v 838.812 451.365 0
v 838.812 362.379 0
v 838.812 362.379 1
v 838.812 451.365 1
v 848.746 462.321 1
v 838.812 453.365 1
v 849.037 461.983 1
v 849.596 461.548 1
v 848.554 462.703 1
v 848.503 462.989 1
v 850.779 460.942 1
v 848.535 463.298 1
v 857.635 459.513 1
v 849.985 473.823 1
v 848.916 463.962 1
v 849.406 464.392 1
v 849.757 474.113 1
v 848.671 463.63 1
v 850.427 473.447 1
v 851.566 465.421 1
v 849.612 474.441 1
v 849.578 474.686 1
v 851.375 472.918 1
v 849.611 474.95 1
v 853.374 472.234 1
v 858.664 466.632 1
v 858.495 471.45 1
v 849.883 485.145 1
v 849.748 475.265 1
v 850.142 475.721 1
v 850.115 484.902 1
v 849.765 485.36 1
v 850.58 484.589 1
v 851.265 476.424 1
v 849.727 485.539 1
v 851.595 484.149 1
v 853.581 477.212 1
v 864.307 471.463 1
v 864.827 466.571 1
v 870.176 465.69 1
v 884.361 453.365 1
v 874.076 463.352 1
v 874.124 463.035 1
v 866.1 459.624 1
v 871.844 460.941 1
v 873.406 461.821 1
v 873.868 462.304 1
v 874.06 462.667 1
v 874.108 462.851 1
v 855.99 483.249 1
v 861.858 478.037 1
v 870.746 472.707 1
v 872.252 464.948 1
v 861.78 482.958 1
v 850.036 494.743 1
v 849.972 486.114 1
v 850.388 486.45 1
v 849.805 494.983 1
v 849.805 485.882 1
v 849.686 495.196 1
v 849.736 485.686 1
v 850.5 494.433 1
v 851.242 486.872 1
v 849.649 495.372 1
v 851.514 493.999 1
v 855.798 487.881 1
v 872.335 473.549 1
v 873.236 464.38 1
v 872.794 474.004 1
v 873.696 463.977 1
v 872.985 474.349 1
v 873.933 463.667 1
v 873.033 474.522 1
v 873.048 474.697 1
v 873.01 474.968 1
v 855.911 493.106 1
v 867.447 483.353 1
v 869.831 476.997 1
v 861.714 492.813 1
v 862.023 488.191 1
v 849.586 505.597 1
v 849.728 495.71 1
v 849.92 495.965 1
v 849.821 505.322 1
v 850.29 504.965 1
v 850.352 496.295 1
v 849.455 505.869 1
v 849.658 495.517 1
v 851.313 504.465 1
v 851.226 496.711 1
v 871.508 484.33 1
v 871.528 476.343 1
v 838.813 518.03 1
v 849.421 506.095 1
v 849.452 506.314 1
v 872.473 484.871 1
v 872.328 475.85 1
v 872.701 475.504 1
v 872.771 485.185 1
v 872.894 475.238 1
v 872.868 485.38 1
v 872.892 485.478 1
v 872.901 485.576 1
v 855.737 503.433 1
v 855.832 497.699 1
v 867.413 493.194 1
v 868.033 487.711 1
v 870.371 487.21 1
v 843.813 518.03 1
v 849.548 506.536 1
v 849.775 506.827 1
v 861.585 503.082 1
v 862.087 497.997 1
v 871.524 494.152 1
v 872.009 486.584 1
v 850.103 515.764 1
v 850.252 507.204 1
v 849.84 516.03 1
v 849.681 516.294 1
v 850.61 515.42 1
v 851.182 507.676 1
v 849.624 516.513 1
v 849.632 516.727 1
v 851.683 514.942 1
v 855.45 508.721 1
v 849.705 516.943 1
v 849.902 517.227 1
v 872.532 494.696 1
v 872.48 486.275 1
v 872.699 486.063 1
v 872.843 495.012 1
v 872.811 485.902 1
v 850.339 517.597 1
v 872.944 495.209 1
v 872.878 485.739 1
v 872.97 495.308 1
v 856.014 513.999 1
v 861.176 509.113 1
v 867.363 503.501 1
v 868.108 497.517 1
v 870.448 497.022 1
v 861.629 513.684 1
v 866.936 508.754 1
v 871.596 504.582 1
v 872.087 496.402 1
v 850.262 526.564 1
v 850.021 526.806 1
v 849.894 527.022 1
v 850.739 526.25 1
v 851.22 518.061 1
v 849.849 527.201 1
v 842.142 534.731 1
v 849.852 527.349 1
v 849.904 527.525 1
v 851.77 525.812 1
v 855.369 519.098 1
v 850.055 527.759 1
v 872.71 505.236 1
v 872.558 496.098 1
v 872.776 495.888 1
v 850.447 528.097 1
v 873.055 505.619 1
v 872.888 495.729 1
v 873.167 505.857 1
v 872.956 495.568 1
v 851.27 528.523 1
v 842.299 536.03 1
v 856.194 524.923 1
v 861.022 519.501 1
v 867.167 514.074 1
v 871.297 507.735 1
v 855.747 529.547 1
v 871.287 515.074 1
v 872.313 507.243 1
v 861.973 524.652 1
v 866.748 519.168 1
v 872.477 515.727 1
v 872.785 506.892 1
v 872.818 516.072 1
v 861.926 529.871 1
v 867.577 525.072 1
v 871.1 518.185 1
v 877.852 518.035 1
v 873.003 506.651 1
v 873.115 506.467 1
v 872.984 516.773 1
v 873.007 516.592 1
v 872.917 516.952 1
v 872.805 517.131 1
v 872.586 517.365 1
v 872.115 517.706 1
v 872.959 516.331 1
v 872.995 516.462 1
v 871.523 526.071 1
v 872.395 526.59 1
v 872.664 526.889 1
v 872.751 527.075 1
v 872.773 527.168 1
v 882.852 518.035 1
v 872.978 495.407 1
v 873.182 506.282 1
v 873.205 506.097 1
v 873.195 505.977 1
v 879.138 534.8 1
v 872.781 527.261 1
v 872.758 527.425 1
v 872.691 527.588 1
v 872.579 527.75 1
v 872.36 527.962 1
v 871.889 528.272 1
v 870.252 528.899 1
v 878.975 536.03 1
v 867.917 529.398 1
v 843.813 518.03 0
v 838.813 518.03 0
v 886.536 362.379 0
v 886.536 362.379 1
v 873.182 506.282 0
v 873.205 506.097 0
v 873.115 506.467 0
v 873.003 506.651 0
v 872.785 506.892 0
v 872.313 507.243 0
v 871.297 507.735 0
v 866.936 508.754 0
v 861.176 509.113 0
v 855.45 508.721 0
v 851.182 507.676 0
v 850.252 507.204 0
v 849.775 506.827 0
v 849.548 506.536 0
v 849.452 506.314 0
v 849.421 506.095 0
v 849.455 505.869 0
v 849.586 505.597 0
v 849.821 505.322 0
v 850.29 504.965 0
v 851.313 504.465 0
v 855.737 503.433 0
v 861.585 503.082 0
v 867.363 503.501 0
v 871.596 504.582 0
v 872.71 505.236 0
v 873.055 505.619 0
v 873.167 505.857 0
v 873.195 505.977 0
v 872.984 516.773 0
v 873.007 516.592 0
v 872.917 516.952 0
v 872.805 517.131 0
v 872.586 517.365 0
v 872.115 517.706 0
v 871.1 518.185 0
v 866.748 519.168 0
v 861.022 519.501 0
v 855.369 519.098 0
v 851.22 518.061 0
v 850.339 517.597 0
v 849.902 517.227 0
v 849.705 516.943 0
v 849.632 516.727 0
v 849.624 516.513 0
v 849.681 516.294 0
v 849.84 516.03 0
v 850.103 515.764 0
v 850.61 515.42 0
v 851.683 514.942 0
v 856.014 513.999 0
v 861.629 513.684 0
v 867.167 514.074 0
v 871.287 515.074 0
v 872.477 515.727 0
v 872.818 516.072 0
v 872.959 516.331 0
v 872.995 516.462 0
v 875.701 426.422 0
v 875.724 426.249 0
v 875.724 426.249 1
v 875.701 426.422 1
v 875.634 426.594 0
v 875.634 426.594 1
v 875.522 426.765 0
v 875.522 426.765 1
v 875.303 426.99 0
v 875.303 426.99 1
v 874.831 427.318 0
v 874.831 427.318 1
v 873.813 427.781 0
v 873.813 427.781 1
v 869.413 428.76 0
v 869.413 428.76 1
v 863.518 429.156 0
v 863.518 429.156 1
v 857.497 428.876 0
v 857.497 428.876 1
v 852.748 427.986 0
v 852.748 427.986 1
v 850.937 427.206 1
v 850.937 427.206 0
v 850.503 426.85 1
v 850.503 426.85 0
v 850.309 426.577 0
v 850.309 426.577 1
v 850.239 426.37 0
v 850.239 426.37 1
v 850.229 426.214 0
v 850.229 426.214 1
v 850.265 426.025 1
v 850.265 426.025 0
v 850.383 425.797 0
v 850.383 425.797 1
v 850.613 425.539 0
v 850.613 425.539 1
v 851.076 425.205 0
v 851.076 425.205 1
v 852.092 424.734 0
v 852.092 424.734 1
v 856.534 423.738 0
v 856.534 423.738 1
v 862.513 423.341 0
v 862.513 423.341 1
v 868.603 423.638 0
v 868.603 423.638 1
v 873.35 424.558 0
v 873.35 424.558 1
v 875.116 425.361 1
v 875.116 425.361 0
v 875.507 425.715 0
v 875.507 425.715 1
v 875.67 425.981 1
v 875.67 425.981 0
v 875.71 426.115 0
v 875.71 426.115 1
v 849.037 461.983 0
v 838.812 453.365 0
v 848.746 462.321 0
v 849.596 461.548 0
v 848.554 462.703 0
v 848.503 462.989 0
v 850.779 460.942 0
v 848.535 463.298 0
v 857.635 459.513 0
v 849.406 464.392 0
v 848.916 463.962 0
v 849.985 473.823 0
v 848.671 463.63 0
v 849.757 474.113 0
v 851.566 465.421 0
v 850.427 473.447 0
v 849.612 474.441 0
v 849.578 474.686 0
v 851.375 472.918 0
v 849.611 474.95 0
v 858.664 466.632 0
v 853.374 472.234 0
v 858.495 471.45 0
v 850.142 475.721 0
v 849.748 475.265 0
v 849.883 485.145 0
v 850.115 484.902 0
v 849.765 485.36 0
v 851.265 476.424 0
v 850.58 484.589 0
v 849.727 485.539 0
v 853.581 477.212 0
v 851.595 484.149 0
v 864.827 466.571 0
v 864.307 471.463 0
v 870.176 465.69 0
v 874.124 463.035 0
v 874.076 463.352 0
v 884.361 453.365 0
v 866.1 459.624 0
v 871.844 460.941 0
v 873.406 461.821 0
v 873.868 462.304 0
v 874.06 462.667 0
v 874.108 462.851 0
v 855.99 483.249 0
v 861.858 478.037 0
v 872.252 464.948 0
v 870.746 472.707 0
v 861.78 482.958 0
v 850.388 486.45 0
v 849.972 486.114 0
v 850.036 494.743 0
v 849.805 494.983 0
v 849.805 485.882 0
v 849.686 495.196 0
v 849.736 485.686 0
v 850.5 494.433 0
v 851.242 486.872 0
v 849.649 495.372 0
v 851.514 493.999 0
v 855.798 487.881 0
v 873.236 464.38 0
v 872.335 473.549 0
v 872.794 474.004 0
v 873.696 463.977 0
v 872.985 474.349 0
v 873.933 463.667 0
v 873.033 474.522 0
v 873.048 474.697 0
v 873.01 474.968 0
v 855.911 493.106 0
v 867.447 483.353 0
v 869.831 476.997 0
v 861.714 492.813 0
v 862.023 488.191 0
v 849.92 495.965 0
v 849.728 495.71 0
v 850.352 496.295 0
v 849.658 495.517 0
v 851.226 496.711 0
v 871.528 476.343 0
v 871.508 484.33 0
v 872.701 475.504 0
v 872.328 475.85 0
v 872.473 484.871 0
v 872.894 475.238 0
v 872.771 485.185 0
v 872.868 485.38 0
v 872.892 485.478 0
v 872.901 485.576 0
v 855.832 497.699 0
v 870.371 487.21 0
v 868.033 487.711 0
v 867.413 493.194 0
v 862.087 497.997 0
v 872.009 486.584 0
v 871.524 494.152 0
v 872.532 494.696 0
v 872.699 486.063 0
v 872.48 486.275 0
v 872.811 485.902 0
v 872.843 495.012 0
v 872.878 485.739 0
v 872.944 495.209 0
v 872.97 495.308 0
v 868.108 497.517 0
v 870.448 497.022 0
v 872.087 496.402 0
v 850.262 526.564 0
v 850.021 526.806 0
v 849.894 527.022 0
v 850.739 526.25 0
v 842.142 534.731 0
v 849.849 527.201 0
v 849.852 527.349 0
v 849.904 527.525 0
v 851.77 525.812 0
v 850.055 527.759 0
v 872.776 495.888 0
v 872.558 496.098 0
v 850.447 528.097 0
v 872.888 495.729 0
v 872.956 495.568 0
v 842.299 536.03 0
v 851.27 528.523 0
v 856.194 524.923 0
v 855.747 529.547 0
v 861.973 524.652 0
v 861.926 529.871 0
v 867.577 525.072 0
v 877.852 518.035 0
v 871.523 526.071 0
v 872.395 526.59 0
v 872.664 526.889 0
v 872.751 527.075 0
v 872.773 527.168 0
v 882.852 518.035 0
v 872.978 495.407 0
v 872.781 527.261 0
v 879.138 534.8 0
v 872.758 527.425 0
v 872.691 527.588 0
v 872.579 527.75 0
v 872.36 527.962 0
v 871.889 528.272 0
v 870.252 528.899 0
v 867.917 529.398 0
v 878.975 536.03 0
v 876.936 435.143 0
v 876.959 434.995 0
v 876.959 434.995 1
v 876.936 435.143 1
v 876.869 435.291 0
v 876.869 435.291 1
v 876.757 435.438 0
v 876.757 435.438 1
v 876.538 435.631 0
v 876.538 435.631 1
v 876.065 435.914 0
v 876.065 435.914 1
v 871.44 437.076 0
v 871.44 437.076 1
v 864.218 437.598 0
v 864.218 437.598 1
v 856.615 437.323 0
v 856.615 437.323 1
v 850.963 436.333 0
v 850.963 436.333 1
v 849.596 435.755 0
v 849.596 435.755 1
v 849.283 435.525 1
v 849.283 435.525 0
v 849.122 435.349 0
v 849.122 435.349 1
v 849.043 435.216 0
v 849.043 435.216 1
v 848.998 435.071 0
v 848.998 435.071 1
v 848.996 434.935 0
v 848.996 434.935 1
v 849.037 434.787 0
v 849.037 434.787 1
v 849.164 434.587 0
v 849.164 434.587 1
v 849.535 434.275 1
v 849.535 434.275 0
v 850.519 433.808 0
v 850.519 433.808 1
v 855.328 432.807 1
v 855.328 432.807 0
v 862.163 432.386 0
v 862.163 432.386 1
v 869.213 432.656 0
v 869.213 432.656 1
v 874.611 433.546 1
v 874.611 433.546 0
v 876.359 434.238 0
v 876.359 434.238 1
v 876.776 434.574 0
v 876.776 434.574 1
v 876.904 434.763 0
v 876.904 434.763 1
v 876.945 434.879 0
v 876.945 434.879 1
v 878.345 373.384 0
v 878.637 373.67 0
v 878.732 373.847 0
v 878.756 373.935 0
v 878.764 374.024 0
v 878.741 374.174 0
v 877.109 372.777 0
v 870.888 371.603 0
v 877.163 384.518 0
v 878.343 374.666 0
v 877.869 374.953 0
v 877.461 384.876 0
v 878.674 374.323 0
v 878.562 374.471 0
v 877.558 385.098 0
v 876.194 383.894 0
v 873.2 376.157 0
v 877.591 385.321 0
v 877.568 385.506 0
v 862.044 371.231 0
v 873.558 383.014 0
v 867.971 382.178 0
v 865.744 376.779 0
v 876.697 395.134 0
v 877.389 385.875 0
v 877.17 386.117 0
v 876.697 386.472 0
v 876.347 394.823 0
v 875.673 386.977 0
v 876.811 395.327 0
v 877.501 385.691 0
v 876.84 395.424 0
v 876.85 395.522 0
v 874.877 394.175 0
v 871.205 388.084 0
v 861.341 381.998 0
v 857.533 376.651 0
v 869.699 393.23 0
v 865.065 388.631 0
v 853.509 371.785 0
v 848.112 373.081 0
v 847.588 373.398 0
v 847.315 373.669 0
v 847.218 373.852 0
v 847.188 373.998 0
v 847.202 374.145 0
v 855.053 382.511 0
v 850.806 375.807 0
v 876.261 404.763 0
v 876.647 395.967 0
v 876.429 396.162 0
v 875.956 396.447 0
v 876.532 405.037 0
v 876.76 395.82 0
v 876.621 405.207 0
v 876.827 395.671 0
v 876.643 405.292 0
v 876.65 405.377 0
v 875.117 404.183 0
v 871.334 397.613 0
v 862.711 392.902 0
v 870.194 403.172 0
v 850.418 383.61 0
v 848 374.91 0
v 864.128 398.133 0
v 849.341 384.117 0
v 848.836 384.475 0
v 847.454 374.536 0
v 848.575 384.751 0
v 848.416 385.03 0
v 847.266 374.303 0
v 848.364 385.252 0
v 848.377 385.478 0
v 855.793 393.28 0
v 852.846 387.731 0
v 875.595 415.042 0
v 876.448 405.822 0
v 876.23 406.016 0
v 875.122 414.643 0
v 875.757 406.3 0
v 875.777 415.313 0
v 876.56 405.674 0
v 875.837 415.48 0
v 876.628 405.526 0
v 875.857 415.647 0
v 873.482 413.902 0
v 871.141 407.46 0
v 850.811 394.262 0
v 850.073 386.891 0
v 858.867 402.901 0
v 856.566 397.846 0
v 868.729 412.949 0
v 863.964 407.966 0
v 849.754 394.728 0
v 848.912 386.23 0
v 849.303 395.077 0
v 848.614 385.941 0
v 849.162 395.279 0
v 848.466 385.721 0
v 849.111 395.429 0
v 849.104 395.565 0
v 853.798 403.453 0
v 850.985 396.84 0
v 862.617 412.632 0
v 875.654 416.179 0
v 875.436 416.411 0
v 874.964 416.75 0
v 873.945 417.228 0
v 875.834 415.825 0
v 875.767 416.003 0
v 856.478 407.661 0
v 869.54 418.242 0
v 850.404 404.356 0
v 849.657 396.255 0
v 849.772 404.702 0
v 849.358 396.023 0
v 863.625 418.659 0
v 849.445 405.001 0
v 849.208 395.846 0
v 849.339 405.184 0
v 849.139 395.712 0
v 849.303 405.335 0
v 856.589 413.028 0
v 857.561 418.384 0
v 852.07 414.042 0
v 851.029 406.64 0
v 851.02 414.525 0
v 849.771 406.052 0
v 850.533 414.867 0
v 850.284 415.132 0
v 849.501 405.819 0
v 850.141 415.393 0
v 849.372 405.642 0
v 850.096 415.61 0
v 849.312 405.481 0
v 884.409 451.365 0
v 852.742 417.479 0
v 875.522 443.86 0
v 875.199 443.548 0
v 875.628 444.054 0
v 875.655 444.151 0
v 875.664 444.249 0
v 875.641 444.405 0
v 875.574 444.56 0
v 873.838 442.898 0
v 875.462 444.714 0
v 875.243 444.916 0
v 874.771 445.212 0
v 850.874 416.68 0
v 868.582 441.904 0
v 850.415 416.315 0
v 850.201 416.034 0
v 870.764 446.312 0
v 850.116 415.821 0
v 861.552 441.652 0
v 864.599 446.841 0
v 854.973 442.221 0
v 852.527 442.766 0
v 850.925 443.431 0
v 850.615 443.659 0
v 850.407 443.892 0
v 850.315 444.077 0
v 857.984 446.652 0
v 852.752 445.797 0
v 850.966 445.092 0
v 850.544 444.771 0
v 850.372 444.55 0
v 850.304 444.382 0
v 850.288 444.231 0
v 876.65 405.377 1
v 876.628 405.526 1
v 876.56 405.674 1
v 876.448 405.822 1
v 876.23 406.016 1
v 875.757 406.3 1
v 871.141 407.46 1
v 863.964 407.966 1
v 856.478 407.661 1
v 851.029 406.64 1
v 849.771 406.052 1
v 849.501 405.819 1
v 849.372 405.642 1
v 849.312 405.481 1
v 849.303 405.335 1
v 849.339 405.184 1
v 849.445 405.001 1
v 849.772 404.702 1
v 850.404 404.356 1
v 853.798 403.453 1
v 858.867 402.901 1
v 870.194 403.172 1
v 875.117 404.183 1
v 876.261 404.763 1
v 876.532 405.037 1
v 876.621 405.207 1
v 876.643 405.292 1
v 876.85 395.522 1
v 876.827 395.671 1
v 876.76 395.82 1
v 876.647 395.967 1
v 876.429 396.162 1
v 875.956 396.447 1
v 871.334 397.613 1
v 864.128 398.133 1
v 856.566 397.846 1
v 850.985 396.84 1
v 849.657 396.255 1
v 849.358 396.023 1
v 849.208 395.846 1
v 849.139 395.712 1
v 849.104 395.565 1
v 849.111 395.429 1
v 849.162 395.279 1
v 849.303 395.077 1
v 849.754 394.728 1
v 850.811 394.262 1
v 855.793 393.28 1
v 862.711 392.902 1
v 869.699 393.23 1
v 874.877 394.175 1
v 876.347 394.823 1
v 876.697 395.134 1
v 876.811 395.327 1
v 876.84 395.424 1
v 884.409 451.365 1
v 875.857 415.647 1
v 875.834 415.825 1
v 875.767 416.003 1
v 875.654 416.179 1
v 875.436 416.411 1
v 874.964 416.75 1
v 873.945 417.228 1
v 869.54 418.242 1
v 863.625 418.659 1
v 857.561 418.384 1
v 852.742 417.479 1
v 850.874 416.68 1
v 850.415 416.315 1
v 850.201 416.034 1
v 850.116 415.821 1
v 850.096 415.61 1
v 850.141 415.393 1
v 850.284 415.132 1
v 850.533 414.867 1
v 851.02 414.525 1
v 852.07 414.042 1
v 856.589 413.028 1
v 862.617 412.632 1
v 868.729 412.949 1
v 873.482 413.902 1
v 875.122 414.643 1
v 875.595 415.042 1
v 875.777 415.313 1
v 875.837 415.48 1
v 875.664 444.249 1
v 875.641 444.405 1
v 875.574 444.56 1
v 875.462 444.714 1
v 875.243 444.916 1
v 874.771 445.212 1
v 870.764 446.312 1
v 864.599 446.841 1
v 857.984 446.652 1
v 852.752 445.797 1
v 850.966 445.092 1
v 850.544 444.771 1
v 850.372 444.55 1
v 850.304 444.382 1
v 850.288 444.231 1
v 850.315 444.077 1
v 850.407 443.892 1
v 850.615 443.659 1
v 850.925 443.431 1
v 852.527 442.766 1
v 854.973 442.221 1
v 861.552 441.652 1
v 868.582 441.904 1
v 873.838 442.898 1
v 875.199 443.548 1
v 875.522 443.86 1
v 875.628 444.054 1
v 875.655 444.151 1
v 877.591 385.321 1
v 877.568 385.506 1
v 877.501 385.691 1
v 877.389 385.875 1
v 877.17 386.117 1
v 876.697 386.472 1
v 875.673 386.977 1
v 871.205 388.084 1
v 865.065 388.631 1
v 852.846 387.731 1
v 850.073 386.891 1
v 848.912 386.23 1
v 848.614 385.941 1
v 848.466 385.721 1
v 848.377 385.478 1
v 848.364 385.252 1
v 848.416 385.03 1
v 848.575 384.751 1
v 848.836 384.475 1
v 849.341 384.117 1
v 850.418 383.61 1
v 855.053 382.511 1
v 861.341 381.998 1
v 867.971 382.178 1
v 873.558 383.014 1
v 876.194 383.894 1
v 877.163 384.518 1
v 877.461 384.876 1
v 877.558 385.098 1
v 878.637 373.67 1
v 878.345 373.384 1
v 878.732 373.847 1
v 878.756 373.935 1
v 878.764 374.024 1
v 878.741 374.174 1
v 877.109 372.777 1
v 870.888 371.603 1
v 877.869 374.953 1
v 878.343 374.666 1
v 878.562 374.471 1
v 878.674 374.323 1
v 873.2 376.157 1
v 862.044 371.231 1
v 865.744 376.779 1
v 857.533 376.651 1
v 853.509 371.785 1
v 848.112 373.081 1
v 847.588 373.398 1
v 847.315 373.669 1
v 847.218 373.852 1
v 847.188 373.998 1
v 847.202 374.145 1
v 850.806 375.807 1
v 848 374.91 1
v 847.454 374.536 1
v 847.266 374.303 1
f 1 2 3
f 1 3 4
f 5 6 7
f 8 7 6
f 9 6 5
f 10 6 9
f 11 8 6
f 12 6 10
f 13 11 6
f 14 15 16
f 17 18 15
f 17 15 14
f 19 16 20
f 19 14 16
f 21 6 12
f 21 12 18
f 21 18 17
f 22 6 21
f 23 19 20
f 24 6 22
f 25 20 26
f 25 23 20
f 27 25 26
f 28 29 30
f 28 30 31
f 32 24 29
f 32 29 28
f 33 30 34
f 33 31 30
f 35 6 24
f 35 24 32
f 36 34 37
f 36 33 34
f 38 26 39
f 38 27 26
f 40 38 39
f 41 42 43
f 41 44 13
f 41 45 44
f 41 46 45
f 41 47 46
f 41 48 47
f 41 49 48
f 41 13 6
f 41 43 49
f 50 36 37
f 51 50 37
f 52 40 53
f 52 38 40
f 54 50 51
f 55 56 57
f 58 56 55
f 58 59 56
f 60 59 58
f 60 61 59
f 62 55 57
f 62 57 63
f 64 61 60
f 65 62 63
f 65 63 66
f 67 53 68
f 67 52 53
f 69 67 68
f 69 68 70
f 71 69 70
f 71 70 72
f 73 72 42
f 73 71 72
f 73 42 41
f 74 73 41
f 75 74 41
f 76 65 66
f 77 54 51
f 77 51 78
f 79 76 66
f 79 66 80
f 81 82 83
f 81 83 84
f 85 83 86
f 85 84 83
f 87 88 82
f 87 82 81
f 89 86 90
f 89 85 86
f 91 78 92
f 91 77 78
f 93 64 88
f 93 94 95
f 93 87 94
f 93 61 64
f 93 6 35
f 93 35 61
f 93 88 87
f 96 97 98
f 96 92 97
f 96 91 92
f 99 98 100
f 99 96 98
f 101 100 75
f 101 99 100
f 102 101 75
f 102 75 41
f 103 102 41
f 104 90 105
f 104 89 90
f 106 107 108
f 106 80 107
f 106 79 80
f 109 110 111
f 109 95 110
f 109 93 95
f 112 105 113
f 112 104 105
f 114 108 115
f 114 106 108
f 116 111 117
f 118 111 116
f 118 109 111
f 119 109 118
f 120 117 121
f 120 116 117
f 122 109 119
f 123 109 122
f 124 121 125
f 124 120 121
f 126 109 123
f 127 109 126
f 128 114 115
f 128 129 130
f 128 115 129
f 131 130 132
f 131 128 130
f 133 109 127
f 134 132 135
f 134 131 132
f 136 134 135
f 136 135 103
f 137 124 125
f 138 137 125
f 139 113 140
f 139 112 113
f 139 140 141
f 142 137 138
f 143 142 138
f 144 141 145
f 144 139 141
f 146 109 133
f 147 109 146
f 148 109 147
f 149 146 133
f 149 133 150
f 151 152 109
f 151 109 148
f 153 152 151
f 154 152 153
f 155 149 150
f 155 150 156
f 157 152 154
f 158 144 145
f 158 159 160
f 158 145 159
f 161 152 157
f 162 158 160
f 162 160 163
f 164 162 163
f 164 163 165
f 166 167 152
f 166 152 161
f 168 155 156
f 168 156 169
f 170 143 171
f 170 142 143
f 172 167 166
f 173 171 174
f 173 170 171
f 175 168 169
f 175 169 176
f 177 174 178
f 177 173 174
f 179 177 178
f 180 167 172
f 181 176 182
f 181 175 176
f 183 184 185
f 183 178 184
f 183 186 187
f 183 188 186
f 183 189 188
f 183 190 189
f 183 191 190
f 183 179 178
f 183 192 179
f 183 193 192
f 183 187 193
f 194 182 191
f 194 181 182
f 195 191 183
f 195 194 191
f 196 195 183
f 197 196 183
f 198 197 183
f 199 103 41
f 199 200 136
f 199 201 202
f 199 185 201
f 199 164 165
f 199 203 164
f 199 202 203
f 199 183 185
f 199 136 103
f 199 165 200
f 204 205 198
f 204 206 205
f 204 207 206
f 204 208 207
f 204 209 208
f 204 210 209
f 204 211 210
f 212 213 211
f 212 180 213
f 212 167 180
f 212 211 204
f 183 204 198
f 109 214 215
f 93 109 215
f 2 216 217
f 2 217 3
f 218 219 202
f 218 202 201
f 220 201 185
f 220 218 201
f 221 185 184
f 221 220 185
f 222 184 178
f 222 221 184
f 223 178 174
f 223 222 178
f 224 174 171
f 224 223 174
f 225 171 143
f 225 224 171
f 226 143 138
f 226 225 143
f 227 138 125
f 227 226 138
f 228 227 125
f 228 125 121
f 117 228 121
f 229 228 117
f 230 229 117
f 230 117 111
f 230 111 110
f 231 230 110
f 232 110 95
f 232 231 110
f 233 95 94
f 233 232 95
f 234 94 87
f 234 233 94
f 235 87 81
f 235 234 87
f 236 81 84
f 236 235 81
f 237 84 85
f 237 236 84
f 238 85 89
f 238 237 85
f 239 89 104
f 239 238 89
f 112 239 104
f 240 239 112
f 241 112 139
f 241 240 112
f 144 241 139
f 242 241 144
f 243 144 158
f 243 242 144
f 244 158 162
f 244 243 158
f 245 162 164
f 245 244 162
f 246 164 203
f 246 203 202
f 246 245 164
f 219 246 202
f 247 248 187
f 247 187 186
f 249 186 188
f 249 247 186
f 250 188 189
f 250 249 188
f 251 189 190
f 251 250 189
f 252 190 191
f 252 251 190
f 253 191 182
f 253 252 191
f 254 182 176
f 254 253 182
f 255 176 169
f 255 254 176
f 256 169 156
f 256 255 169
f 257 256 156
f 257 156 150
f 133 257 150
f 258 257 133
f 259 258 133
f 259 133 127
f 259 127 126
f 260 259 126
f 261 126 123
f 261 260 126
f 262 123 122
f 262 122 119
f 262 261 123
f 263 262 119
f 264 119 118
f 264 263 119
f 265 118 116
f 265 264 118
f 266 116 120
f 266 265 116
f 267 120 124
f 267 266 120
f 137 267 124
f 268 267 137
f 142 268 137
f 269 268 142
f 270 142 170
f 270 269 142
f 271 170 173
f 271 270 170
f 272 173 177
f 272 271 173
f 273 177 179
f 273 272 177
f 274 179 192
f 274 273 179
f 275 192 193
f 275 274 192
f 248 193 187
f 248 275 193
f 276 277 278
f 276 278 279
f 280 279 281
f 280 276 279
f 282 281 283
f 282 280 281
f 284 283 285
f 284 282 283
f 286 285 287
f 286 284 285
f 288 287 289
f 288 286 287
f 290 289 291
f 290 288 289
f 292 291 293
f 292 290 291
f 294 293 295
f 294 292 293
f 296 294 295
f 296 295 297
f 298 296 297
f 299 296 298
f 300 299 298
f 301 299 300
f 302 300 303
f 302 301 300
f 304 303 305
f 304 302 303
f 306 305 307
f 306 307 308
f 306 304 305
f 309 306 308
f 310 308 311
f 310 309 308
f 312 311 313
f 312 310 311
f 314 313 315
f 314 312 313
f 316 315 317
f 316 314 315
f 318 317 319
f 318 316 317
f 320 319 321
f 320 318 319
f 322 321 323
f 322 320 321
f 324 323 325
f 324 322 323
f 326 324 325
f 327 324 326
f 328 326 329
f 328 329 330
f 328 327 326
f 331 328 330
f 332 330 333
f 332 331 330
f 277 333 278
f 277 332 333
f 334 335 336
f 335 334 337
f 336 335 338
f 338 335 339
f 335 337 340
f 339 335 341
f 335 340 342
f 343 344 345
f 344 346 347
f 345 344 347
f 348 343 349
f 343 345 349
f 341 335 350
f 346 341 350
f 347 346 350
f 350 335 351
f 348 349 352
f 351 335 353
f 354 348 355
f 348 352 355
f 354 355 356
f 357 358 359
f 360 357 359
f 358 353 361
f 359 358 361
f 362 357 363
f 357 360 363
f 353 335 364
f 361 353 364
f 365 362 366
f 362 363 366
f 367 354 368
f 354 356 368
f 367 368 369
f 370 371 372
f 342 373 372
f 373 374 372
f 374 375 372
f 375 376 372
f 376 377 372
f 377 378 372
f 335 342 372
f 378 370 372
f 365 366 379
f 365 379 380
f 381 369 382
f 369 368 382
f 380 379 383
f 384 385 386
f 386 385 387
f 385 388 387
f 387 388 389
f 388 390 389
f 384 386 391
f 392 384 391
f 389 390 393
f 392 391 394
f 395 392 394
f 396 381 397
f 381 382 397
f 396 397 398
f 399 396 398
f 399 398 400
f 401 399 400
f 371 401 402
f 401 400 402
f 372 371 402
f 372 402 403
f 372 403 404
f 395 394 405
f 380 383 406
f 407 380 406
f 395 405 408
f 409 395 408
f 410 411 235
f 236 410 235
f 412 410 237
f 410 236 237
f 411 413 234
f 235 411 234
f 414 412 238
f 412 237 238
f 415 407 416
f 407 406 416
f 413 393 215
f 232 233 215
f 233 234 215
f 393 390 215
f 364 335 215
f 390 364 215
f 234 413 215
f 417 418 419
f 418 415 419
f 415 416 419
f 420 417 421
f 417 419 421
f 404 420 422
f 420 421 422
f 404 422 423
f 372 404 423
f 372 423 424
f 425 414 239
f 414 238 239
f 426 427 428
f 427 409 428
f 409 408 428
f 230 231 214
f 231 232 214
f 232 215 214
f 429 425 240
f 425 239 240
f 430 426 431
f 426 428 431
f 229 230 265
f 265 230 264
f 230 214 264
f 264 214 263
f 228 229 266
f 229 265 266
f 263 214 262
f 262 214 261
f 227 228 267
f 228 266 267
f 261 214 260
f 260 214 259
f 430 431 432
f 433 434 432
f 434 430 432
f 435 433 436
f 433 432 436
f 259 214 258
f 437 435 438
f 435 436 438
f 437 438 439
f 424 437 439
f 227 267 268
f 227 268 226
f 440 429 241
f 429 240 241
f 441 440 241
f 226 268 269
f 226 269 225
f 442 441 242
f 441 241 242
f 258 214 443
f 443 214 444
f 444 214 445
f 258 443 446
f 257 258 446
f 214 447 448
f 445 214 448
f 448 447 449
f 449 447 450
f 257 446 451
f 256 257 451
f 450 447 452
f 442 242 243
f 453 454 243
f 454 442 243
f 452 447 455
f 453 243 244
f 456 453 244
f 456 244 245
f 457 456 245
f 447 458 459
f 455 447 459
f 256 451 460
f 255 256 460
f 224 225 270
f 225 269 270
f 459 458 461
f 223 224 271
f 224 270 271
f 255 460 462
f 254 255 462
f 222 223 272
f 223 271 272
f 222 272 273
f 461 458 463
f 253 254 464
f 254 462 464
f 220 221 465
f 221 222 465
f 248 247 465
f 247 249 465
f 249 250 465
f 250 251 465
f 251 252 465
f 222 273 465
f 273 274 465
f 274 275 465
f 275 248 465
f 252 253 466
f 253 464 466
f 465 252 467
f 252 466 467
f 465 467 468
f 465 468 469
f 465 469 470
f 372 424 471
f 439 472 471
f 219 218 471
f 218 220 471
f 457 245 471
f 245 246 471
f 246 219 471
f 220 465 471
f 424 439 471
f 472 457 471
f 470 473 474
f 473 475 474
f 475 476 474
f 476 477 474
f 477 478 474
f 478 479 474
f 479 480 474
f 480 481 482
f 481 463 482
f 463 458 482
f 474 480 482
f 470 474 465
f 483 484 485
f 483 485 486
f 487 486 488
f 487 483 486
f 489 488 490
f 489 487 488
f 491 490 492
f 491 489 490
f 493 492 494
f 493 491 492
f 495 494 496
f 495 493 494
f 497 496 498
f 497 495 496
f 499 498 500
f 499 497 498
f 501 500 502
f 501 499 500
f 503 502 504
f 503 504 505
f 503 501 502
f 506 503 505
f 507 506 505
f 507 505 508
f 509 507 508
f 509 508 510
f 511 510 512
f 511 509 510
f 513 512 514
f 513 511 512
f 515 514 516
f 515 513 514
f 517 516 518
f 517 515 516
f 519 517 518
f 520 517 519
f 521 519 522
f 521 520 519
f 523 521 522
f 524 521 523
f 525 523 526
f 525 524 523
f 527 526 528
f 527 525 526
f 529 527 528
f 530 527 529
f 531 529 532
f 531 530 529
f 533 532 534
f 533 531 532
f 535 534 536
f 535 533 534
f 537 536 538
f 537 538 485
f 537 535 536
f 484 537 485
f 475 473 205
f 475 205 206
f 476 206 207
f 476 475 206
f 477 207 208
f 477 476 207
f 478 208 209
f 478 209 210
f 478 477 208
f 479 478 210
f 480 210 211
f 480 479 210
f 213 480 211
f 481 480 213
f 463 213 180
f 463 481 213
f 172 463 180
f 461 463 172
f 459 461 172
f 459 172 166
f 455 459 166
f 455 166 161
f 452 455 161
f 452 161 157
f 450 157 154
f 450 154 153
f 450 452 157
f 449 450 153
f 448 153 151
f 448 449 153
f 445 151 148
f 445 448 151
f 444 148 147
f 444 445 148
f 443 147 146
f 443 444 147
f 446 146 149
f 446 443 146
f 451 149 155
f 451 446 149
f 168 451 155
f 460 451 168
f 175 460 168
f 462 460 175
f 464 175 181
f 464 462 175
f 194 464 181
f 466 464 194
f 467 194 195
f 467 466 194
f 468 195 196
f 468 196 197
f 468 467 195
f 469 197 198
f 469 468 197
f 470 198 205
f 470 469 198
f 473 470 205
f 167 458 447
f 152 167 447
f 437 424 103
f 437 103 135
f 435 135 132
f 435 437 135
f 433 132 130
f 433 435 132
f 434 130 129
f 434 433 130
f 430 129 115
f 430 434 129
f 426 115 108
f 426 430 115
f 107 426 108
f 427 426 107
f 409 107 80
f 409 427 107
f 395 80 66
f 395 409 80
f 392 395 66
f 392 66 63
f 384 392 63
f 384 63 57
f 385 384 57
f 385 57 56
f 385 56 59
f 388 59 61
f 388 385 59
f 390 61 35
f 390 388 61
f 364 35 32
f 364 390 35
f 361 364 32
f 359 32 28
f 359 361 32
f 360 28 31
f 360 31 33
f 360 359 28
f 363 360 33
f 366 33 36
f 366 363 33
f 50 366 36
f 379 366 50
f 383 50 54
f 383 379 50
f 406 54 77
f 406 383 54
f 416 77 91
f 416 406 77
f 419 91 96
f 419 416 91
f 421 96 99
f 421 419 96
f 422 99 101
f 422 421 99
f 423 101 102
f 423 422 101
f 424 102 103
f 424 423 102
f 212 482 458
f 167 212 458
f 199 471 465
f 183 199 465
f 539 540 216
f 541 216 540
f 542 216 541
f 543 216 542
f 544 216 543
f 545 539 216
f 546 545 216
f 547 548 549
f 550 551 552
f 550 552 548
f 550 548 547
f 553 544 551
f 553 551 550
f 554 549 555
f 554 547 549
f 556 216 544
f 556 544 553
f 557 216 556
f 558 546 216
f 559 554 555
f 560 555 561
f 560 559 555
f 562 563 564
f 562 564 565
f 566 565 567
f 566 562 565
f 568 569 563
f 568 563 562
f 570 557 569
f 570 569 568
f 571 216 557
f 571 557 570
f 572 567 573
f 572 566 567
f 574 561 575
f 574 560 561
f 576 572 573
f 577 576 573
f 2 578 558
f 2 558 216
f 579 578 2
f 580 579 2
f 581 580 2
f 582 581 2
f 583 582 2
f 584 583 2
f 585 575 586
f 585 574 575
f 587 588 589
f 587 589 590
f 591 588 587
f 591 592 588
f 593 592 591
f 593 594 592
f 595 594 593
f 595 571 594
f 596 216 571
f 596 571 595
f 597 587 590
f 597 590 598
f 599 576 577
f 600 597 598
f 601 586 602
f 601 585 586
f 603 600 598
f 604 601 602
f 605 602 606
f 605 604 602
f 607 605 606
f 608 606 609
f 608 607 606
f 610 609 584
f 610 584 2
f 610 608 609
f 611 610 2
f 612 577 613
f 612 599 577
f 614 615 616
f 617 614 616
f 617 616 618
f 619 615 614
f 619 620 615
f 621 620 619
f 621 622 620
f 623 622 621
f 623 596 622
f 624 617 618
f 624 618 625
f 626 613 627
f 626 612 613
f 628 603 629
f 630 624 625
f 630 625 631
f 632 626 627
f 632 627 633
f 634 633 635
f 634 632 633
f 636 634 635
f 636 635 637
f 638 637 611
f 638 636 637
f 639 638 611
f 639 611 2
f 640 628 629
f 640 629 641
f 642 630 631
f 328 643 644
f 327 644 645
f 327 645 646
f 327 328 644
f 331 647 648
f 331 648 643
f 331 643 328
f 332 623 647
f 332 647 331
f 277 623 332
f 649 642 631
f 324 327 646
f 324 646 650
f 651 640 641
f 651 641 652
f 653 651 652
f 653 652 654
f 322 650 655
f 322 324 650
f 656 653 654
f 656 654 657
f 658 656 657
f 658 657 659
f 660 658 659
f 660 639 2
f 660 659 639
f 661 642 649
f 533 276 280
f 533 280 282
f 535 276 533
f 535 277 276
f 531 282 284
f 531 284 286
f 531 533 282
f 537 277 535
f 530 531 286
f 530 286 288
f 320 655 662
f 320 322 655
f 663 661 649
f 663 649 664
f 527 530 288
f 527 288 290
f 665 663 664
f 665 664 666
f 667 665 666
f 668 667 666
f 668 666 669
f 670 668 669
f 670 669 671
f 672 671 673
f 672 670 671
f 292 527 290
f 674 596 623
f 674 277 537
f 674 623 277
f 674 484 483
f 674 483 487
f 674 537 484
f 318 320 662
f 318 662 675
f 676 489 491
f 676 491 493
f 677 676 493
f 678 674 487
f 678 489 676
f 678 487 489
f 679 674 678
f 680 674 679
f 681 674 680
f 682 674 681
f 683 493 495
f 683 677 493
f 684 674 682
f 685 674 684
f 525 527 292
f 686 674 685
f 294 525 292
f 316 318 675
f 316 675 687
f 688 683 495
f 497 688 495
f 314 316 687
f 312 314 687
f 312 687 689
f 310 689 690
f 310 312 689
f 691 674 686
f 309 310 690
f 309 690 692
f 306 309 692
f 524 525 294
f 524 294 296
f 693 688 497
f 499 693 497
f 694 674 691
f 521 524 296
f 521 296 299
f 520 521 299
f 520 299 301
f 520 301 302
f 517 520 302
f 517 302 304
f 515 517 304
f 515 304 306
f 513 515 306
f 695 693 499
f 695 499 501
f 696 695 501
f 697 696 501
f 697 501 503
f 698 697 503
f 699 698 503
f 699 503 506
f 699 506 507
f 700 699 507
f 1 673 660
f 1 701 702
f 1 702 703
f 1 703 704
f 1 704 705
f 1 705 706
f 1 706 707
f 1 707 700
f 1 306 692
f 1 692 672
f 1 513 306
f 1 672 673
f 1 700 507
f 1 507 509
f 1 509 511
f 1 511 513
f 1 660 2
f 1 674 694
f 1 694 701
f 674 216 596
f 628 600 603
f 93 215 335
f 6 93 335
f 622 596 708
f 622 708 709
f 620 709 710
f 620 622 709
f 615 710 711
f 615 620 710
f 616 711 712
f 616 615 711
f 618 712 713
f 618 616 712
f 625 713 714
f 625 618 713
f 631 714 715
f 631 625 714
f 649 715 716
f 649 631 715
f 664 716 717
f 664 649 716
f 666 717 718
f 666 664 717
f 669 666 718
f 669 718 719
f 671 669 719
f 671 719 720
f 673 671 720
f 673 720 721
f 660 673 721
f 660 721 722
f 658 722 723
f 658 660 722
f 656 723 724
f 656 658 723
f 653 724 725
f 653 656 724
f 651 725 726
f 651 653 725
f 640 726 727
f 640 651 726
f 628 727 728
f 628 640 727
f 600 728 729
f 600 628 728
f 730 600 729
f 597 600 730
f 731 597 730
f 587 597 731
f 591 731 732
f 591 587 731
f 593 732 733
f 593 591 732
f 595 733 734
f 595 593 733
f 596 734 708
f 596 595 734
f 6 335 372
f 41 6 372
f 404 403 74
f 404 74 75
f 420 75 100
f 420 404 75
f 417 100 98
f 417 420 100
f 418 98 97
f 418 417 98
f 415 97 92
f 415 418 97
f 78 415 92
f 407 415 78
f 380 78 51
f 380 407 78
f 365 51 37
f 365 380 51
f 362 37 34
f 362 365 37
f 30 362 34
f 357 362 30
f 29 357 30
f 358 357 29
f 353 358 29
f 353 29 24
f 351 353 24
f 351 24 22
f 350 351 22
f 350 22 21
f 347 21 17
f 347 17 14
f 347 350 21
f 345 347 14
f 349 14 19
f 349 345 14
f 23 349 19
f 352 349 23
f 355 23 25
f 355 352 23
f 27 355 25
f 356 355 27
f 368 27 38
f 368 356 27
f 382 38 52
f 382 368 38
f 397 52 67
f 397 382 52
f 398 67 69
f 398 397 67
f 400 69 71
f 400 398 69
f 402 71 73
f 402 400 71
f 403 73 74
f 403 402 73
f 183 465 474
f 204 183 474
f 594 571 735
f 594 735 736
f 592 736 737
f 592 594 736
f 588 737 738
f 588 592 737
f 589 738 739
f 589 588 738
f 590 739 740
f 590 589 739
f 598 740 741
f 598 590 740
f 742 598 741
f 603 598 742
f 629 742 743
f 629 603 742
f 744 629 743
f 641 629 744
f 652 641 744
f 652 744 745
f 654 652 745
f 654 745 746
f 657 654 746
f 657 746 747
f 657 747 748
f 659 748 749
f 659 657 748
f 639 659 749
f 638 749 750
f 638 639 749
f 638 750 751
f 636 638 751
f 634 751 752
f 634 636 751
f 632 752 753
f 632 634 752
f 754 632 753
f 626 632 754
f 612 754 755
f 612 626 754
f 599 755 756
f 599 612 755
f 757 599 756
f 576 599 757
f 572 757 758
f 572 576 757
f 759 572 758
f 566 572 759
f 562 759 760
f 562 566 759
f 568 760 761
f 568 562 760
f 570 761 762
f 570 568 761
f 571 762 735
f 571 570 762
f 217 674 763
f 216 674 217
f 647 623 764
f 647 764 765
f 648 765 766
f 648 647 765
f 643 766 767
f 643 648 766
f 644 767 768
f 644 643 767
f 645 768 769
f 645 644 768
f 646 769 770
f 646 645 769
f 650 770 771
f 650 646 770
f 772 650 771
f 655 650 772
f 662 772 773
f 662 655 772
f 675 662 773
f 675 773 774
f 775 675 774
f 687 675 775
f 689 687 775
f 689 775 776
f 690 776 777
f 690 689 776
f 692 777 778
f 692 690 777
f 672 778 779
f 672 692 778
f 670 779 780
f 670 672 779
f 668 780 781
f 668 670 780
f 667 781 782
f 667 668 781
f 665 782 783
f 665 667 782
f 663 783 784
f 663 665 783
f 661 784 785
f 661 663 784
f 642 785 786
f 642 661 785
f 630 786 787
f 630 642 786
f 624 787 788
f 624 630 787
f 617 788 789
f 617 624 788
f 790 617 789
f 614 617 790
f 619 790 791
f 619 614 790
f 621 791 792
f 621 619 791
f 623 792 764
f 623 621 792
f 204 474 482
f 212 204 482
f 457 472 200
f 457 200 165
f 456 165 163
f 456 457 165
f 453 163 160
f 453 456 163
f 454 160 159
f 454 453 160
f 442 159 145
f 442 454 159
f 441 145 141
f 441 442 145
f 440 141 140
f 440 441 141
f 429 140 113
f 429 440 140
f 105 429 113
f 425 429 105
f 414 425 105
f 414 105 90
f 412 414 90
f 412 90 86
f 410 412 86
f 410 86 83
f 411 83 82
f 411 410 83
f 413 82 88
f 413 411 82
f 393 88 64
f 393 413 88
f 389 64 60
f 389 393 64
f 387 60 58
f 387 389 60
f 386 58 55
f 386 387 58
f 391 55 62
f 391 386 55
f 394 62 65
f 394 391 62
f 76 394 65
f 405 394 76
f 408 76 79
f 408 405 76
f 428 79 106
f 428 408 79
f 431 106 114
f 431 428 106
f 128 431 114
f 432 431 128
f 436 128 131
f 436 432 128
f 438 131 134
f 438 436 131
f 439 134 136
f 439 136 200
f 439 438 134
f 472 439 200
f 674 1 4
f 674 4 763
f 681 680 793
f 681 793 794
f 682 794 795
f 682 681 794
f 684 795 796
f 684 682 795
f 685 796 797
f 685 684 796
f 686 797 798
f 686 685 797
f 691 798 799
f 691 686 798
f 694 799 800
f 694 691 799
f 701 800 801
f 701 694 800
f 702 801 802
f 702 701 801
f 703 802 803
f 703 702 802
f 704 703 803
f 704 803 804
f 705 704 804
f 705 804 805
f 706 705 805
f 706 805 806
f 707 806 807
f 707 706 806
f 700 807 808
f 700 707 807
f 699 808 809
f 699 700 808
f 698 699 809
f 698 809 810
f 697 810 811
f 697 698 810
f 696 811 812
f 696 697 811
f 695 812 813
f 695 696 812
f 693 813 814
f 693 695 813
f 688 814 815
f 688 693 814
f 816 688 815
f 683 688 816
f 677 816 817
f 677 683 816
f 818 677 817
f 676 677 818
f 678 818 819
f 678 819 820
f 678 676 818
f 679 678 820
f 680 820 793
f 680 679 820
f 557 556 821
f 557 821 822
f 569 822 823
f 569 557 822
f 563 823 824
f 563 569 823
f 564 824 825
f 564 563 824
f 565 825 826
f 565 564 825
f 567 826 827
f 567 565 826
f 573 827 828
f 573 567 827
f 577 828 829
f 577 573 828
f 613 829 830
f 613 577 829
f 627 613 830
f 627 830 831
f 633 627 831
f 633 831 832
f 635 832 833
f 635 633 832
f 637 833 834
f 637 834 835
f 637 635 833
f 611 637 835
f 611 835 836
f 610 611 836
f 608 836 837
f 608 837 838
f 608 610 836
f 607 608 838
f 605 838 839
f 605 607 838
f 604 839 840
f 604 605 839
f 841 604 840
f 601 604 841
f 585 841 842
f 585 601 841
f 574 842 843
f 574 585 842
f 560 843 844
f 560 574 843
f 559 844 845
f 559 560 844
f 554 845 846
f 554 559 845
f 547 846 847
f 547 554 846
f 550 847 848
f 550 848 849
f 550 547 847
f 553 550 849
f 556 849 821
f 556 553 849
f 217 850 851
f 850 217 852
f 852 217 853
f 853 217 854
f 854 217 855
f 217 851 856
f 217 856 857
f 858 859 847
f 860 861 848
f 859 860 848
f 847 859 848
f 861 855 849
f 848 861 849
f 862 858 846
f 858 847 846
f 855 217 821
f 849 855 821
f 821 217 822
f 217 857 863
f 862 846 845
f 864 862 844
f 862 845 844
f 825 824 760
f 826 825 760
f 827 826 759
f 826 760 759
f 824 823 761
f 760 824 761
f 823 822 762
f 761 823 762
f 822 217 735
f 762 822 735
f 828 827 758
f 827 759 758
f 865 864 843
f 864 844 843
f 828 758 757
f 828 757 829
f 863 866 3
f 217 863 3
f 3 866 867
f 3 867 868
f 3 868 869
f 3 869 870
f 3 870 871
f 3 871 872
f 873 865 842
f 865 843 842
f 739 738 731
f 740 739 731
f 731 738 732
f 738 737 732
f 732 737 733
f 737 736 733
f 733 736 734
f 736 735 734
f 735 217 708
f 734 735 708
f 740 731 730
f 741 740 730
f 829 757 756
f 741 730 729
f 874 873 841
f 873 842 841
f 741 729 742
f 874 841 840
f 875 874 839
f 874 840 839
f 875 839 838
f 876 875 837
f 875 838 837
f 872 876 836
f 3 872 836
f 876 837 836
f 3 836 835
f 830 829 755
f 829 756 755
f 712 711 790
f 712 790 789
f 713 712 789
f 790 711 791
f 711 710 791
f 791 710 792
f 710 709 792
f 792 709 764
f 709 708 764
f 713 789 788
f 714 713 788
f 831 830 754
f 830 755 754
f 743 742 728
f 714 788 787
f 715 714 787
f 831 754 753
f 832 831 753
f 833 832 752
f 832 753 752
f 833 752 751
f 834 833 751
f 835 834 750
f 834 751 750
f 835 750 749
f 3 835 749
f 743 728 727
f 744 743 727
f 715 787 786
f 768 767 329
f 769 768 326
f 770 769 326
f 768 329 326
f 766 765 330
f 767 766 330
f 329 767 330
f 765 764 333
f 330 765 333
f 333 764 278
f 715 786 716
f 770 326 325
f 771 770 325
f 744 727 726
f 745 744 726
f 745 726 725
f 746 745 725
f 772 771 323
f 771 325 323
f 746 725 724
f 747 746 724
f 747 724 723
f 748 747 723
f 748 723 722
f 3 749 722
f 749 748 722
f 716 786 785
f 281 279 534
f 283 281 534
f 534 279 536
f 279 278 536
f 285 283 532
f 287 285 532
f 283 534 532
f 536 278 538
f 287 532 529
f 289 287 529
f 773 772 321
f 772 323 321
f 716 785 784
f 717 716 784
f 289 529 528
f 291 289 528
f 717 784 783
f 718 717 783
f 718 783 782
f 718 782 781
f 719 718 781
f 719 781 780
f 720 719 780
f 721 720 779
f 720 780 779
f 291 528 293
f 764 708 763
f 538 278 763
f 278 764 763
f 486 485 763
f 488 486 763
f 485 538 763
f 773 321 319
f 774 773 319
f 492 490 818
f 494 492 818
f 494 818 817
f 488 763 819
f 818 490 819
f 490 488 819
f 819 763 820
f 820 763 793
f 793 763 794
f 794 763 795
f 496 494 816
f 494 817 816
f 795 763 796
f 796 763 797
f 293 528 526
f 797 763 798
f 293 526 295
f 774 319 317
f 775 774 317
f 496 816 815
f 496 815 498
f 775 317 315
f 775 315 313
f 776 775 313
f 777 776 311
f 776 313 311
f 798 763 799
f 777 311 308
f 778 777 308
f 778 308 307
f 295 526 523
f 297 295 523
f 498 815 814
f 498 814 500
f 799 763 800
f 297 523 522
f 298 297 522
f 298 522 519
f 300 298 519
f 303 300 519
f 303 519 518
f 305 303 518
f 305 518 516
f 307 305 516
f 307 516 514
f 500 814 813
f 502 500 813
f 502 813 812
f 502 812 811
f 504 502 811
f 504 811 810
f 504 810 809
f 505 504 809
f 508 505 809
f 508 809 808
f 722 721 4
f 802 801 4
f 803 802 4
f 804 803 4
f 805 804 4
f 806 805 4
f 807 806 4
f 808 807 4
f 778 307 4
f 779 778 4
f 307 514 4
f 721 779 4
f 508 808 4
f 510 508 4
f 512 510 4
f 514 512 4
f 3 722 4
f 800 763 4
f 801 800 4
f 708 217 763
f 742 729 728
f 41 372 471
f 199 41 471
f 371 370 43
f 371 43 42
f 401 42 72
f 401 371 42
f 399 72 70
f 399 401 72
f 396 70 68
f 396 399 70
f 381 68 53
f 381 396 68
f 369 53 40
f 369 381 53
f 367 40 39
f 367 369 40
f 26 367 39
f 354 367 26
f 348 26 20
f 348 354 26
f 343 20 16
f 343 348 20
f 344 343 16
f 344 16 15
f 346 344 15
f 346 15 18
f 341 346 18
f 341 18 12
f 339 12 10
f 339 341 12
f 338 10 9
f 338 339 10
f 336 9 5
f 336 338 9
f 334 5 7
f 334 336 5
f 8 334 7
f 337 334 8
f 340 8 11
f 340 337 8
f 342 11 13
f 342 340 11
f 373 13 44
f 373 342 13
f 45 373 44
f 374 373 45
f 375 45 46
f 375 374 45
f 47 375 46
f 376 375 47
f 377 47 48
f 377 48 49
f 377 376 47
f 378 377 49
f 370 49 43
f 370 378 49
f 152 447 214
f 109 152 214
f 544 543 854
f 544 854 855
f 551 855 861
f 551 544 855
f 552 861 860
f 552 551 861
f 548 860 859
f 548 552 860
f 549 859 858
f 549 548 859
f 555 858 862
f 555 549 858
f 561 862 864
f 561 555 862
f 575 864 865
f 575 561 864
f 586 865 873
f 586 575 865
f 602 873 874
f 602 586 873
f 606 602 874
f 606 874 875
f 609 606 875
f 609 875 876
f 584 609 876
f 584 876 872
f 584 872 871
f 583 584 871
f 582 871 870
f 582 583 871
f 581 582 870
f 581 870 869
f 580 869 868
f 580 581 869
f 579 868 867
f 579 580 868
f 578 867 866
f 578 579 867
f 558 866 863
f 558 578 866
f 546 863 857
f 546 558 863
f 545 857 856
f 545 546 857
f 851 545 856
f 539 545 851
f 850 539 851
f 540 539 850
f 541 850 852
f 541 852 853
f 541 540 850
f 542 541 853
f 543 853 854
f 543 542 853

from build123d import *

# Parameters (mm, degrees)
MODEL_RX          = 12.810793527
MODEL_RY          = 3.676944785
MODEL_RX_2        = 11.73547223
MODEL_RY_2        = 3.344158456
MODEL_RX_3        = 11.587591631
MODEL_RY_3        = 2.620371998
MODEL_RX_4        = 11.665285619
MODEL_RY_4        = 2.595913441
MODEL_RX_5        = 11.891821935
MODEL_RY_5        = 3.015935615
MODEL_RX_6        = 11.693519243
MODEL_RY_6        = 2.909465442
MODEL_RX_7        = 11.467552114
MODEL_RY_7        = 2.613646551
EXTRUDE_1_DEPTH   = 1
MODEL_RX_8        = 15.788071885
MODEL_RY_8        = 2.798308389
MODEL_RX_9        = 14.615056558
MODEL_RX_10       = 13.873877308
MODEL_RX_11       = 13.674485311
MODEL_RX_12       = 12.880803494
MODEL_RX_13       = 12.748045597
MODEL_RX_14       = 13.98305321
MODEL_RX_15       = 12.687966957
EXTRUDE_1_2_DEPTH = 1


with BuildPart() as part:
    # Model → 凸台-拉伸1 (new body)
    with BuildSketch(Plane.XY):
        Polygon((838.812318942, 453.365497759), (884.3612651, 453.365497759), (882.852260835, 518.035258225), (877.852260835, 518.035258225), (879.138034268, 534.800409711), (878.975245436, 536.029815694), (842.299167643, 536.029815694), (842.142482059, 534.731315909), (843.812567805, 518.029815692), (838.812567805, 518.029815692), align=None)
        with Locations((861.31300321, 463.03468948)):
            Ellipse(MODEL_RX, MODEL_RY, mode=Mode.SUBTRACT)
        with Locations((861.31300321, 474.696606348)):
            Ellipse(MODEL_RX_2, MODEL_RY_2, mode=Mode.SUBTRACT)
        with Locations((861.31300321, 485.576051895)):
            Ellipse(MODEL_RX_3, MODEL_RY_3, mode=Mode.SUBTRACT)
        with Locations((861.31300321, 495.407135251)):
            Ellipse(MODEL_RX_4, MODEL_RY_4, mode=Mode.SUBTRACT)
        with Locations((861.31300321, 506.096945682)):
            Ellipse(MODEL_RX_5, MODEL_RY_5, mode=Mode.SUBTRACT)
        with Locations((861.31300321, 516.592227033)):
            Ellipse(MODEL_RX_6, MODEL_RY_6, mode=Mode.SUBTRACT)
        with Locations((861.31300321, 527.261411301)):
            Ellipse(MODEL_RX_7, MODEL_RY_7, mode=Mode.SUBTRACT)
    extrude(amount=EXTRUDE_1_DEPTH)


with BuildPart() as body_2:
    # Model → Extrude 1 2 (new body)
    with BuildSketch(Plane.XY):
        Polygon((838.812072799, 362.379421788), (838.812318942, 451.365497759), (884.409069415, 451.365497759), (886.535705871, 362.379421788), align=None)
        with Locations((862.975707439, 374.024304205)):
            Ellipse(MODEL_RX_8, MODEL_RY_8, mode=Mode.SUBTRACT)
        with Locations((862.975707439, 385.32075675)):
            Ellipse(MODEL_RX_9, MODEL_RY_2, mode=Mode.SUBTRACT)
        with Locations((862.975707439, 395.521697164)):
            Ellipse(MODEL_RX_10, MODEL_RY_3, mode=Mode.SUBTRACT)
        with Locations((862.975707439, 405.377239078)):
            Ellipse(MODEL_RX_11, MODEL_RY_4, mode=Mode.SUBTRACT)
        with Locations((862.975707439, 415.647027334)):
            Ellipse(MODEL_RX_12, MODEL_RY_5, mode=Mode.SUBTRACT)
        with Locations((862.975707439, 426.248778858)):
            Ellipse(MODEL_RX_13, MODEL_RY_6, mode=Mode.SUBTRACT)
        with Locations((862.975707439, 434.995178452)):
            Ellipse(MODEL_RX_14, MODEL_RY_7, mode=Mode.SUBTRACT)
        with Locations((862.975707439, 444.248932304)):
            Ellipse(MODEL_RX_15, MODEL_RY_7, mode=Mode.SUBTRACT)
    extrude(amount=EXTRUDE_1_2_DEPTH)


solid = Compound([part.part, body_2.part])
